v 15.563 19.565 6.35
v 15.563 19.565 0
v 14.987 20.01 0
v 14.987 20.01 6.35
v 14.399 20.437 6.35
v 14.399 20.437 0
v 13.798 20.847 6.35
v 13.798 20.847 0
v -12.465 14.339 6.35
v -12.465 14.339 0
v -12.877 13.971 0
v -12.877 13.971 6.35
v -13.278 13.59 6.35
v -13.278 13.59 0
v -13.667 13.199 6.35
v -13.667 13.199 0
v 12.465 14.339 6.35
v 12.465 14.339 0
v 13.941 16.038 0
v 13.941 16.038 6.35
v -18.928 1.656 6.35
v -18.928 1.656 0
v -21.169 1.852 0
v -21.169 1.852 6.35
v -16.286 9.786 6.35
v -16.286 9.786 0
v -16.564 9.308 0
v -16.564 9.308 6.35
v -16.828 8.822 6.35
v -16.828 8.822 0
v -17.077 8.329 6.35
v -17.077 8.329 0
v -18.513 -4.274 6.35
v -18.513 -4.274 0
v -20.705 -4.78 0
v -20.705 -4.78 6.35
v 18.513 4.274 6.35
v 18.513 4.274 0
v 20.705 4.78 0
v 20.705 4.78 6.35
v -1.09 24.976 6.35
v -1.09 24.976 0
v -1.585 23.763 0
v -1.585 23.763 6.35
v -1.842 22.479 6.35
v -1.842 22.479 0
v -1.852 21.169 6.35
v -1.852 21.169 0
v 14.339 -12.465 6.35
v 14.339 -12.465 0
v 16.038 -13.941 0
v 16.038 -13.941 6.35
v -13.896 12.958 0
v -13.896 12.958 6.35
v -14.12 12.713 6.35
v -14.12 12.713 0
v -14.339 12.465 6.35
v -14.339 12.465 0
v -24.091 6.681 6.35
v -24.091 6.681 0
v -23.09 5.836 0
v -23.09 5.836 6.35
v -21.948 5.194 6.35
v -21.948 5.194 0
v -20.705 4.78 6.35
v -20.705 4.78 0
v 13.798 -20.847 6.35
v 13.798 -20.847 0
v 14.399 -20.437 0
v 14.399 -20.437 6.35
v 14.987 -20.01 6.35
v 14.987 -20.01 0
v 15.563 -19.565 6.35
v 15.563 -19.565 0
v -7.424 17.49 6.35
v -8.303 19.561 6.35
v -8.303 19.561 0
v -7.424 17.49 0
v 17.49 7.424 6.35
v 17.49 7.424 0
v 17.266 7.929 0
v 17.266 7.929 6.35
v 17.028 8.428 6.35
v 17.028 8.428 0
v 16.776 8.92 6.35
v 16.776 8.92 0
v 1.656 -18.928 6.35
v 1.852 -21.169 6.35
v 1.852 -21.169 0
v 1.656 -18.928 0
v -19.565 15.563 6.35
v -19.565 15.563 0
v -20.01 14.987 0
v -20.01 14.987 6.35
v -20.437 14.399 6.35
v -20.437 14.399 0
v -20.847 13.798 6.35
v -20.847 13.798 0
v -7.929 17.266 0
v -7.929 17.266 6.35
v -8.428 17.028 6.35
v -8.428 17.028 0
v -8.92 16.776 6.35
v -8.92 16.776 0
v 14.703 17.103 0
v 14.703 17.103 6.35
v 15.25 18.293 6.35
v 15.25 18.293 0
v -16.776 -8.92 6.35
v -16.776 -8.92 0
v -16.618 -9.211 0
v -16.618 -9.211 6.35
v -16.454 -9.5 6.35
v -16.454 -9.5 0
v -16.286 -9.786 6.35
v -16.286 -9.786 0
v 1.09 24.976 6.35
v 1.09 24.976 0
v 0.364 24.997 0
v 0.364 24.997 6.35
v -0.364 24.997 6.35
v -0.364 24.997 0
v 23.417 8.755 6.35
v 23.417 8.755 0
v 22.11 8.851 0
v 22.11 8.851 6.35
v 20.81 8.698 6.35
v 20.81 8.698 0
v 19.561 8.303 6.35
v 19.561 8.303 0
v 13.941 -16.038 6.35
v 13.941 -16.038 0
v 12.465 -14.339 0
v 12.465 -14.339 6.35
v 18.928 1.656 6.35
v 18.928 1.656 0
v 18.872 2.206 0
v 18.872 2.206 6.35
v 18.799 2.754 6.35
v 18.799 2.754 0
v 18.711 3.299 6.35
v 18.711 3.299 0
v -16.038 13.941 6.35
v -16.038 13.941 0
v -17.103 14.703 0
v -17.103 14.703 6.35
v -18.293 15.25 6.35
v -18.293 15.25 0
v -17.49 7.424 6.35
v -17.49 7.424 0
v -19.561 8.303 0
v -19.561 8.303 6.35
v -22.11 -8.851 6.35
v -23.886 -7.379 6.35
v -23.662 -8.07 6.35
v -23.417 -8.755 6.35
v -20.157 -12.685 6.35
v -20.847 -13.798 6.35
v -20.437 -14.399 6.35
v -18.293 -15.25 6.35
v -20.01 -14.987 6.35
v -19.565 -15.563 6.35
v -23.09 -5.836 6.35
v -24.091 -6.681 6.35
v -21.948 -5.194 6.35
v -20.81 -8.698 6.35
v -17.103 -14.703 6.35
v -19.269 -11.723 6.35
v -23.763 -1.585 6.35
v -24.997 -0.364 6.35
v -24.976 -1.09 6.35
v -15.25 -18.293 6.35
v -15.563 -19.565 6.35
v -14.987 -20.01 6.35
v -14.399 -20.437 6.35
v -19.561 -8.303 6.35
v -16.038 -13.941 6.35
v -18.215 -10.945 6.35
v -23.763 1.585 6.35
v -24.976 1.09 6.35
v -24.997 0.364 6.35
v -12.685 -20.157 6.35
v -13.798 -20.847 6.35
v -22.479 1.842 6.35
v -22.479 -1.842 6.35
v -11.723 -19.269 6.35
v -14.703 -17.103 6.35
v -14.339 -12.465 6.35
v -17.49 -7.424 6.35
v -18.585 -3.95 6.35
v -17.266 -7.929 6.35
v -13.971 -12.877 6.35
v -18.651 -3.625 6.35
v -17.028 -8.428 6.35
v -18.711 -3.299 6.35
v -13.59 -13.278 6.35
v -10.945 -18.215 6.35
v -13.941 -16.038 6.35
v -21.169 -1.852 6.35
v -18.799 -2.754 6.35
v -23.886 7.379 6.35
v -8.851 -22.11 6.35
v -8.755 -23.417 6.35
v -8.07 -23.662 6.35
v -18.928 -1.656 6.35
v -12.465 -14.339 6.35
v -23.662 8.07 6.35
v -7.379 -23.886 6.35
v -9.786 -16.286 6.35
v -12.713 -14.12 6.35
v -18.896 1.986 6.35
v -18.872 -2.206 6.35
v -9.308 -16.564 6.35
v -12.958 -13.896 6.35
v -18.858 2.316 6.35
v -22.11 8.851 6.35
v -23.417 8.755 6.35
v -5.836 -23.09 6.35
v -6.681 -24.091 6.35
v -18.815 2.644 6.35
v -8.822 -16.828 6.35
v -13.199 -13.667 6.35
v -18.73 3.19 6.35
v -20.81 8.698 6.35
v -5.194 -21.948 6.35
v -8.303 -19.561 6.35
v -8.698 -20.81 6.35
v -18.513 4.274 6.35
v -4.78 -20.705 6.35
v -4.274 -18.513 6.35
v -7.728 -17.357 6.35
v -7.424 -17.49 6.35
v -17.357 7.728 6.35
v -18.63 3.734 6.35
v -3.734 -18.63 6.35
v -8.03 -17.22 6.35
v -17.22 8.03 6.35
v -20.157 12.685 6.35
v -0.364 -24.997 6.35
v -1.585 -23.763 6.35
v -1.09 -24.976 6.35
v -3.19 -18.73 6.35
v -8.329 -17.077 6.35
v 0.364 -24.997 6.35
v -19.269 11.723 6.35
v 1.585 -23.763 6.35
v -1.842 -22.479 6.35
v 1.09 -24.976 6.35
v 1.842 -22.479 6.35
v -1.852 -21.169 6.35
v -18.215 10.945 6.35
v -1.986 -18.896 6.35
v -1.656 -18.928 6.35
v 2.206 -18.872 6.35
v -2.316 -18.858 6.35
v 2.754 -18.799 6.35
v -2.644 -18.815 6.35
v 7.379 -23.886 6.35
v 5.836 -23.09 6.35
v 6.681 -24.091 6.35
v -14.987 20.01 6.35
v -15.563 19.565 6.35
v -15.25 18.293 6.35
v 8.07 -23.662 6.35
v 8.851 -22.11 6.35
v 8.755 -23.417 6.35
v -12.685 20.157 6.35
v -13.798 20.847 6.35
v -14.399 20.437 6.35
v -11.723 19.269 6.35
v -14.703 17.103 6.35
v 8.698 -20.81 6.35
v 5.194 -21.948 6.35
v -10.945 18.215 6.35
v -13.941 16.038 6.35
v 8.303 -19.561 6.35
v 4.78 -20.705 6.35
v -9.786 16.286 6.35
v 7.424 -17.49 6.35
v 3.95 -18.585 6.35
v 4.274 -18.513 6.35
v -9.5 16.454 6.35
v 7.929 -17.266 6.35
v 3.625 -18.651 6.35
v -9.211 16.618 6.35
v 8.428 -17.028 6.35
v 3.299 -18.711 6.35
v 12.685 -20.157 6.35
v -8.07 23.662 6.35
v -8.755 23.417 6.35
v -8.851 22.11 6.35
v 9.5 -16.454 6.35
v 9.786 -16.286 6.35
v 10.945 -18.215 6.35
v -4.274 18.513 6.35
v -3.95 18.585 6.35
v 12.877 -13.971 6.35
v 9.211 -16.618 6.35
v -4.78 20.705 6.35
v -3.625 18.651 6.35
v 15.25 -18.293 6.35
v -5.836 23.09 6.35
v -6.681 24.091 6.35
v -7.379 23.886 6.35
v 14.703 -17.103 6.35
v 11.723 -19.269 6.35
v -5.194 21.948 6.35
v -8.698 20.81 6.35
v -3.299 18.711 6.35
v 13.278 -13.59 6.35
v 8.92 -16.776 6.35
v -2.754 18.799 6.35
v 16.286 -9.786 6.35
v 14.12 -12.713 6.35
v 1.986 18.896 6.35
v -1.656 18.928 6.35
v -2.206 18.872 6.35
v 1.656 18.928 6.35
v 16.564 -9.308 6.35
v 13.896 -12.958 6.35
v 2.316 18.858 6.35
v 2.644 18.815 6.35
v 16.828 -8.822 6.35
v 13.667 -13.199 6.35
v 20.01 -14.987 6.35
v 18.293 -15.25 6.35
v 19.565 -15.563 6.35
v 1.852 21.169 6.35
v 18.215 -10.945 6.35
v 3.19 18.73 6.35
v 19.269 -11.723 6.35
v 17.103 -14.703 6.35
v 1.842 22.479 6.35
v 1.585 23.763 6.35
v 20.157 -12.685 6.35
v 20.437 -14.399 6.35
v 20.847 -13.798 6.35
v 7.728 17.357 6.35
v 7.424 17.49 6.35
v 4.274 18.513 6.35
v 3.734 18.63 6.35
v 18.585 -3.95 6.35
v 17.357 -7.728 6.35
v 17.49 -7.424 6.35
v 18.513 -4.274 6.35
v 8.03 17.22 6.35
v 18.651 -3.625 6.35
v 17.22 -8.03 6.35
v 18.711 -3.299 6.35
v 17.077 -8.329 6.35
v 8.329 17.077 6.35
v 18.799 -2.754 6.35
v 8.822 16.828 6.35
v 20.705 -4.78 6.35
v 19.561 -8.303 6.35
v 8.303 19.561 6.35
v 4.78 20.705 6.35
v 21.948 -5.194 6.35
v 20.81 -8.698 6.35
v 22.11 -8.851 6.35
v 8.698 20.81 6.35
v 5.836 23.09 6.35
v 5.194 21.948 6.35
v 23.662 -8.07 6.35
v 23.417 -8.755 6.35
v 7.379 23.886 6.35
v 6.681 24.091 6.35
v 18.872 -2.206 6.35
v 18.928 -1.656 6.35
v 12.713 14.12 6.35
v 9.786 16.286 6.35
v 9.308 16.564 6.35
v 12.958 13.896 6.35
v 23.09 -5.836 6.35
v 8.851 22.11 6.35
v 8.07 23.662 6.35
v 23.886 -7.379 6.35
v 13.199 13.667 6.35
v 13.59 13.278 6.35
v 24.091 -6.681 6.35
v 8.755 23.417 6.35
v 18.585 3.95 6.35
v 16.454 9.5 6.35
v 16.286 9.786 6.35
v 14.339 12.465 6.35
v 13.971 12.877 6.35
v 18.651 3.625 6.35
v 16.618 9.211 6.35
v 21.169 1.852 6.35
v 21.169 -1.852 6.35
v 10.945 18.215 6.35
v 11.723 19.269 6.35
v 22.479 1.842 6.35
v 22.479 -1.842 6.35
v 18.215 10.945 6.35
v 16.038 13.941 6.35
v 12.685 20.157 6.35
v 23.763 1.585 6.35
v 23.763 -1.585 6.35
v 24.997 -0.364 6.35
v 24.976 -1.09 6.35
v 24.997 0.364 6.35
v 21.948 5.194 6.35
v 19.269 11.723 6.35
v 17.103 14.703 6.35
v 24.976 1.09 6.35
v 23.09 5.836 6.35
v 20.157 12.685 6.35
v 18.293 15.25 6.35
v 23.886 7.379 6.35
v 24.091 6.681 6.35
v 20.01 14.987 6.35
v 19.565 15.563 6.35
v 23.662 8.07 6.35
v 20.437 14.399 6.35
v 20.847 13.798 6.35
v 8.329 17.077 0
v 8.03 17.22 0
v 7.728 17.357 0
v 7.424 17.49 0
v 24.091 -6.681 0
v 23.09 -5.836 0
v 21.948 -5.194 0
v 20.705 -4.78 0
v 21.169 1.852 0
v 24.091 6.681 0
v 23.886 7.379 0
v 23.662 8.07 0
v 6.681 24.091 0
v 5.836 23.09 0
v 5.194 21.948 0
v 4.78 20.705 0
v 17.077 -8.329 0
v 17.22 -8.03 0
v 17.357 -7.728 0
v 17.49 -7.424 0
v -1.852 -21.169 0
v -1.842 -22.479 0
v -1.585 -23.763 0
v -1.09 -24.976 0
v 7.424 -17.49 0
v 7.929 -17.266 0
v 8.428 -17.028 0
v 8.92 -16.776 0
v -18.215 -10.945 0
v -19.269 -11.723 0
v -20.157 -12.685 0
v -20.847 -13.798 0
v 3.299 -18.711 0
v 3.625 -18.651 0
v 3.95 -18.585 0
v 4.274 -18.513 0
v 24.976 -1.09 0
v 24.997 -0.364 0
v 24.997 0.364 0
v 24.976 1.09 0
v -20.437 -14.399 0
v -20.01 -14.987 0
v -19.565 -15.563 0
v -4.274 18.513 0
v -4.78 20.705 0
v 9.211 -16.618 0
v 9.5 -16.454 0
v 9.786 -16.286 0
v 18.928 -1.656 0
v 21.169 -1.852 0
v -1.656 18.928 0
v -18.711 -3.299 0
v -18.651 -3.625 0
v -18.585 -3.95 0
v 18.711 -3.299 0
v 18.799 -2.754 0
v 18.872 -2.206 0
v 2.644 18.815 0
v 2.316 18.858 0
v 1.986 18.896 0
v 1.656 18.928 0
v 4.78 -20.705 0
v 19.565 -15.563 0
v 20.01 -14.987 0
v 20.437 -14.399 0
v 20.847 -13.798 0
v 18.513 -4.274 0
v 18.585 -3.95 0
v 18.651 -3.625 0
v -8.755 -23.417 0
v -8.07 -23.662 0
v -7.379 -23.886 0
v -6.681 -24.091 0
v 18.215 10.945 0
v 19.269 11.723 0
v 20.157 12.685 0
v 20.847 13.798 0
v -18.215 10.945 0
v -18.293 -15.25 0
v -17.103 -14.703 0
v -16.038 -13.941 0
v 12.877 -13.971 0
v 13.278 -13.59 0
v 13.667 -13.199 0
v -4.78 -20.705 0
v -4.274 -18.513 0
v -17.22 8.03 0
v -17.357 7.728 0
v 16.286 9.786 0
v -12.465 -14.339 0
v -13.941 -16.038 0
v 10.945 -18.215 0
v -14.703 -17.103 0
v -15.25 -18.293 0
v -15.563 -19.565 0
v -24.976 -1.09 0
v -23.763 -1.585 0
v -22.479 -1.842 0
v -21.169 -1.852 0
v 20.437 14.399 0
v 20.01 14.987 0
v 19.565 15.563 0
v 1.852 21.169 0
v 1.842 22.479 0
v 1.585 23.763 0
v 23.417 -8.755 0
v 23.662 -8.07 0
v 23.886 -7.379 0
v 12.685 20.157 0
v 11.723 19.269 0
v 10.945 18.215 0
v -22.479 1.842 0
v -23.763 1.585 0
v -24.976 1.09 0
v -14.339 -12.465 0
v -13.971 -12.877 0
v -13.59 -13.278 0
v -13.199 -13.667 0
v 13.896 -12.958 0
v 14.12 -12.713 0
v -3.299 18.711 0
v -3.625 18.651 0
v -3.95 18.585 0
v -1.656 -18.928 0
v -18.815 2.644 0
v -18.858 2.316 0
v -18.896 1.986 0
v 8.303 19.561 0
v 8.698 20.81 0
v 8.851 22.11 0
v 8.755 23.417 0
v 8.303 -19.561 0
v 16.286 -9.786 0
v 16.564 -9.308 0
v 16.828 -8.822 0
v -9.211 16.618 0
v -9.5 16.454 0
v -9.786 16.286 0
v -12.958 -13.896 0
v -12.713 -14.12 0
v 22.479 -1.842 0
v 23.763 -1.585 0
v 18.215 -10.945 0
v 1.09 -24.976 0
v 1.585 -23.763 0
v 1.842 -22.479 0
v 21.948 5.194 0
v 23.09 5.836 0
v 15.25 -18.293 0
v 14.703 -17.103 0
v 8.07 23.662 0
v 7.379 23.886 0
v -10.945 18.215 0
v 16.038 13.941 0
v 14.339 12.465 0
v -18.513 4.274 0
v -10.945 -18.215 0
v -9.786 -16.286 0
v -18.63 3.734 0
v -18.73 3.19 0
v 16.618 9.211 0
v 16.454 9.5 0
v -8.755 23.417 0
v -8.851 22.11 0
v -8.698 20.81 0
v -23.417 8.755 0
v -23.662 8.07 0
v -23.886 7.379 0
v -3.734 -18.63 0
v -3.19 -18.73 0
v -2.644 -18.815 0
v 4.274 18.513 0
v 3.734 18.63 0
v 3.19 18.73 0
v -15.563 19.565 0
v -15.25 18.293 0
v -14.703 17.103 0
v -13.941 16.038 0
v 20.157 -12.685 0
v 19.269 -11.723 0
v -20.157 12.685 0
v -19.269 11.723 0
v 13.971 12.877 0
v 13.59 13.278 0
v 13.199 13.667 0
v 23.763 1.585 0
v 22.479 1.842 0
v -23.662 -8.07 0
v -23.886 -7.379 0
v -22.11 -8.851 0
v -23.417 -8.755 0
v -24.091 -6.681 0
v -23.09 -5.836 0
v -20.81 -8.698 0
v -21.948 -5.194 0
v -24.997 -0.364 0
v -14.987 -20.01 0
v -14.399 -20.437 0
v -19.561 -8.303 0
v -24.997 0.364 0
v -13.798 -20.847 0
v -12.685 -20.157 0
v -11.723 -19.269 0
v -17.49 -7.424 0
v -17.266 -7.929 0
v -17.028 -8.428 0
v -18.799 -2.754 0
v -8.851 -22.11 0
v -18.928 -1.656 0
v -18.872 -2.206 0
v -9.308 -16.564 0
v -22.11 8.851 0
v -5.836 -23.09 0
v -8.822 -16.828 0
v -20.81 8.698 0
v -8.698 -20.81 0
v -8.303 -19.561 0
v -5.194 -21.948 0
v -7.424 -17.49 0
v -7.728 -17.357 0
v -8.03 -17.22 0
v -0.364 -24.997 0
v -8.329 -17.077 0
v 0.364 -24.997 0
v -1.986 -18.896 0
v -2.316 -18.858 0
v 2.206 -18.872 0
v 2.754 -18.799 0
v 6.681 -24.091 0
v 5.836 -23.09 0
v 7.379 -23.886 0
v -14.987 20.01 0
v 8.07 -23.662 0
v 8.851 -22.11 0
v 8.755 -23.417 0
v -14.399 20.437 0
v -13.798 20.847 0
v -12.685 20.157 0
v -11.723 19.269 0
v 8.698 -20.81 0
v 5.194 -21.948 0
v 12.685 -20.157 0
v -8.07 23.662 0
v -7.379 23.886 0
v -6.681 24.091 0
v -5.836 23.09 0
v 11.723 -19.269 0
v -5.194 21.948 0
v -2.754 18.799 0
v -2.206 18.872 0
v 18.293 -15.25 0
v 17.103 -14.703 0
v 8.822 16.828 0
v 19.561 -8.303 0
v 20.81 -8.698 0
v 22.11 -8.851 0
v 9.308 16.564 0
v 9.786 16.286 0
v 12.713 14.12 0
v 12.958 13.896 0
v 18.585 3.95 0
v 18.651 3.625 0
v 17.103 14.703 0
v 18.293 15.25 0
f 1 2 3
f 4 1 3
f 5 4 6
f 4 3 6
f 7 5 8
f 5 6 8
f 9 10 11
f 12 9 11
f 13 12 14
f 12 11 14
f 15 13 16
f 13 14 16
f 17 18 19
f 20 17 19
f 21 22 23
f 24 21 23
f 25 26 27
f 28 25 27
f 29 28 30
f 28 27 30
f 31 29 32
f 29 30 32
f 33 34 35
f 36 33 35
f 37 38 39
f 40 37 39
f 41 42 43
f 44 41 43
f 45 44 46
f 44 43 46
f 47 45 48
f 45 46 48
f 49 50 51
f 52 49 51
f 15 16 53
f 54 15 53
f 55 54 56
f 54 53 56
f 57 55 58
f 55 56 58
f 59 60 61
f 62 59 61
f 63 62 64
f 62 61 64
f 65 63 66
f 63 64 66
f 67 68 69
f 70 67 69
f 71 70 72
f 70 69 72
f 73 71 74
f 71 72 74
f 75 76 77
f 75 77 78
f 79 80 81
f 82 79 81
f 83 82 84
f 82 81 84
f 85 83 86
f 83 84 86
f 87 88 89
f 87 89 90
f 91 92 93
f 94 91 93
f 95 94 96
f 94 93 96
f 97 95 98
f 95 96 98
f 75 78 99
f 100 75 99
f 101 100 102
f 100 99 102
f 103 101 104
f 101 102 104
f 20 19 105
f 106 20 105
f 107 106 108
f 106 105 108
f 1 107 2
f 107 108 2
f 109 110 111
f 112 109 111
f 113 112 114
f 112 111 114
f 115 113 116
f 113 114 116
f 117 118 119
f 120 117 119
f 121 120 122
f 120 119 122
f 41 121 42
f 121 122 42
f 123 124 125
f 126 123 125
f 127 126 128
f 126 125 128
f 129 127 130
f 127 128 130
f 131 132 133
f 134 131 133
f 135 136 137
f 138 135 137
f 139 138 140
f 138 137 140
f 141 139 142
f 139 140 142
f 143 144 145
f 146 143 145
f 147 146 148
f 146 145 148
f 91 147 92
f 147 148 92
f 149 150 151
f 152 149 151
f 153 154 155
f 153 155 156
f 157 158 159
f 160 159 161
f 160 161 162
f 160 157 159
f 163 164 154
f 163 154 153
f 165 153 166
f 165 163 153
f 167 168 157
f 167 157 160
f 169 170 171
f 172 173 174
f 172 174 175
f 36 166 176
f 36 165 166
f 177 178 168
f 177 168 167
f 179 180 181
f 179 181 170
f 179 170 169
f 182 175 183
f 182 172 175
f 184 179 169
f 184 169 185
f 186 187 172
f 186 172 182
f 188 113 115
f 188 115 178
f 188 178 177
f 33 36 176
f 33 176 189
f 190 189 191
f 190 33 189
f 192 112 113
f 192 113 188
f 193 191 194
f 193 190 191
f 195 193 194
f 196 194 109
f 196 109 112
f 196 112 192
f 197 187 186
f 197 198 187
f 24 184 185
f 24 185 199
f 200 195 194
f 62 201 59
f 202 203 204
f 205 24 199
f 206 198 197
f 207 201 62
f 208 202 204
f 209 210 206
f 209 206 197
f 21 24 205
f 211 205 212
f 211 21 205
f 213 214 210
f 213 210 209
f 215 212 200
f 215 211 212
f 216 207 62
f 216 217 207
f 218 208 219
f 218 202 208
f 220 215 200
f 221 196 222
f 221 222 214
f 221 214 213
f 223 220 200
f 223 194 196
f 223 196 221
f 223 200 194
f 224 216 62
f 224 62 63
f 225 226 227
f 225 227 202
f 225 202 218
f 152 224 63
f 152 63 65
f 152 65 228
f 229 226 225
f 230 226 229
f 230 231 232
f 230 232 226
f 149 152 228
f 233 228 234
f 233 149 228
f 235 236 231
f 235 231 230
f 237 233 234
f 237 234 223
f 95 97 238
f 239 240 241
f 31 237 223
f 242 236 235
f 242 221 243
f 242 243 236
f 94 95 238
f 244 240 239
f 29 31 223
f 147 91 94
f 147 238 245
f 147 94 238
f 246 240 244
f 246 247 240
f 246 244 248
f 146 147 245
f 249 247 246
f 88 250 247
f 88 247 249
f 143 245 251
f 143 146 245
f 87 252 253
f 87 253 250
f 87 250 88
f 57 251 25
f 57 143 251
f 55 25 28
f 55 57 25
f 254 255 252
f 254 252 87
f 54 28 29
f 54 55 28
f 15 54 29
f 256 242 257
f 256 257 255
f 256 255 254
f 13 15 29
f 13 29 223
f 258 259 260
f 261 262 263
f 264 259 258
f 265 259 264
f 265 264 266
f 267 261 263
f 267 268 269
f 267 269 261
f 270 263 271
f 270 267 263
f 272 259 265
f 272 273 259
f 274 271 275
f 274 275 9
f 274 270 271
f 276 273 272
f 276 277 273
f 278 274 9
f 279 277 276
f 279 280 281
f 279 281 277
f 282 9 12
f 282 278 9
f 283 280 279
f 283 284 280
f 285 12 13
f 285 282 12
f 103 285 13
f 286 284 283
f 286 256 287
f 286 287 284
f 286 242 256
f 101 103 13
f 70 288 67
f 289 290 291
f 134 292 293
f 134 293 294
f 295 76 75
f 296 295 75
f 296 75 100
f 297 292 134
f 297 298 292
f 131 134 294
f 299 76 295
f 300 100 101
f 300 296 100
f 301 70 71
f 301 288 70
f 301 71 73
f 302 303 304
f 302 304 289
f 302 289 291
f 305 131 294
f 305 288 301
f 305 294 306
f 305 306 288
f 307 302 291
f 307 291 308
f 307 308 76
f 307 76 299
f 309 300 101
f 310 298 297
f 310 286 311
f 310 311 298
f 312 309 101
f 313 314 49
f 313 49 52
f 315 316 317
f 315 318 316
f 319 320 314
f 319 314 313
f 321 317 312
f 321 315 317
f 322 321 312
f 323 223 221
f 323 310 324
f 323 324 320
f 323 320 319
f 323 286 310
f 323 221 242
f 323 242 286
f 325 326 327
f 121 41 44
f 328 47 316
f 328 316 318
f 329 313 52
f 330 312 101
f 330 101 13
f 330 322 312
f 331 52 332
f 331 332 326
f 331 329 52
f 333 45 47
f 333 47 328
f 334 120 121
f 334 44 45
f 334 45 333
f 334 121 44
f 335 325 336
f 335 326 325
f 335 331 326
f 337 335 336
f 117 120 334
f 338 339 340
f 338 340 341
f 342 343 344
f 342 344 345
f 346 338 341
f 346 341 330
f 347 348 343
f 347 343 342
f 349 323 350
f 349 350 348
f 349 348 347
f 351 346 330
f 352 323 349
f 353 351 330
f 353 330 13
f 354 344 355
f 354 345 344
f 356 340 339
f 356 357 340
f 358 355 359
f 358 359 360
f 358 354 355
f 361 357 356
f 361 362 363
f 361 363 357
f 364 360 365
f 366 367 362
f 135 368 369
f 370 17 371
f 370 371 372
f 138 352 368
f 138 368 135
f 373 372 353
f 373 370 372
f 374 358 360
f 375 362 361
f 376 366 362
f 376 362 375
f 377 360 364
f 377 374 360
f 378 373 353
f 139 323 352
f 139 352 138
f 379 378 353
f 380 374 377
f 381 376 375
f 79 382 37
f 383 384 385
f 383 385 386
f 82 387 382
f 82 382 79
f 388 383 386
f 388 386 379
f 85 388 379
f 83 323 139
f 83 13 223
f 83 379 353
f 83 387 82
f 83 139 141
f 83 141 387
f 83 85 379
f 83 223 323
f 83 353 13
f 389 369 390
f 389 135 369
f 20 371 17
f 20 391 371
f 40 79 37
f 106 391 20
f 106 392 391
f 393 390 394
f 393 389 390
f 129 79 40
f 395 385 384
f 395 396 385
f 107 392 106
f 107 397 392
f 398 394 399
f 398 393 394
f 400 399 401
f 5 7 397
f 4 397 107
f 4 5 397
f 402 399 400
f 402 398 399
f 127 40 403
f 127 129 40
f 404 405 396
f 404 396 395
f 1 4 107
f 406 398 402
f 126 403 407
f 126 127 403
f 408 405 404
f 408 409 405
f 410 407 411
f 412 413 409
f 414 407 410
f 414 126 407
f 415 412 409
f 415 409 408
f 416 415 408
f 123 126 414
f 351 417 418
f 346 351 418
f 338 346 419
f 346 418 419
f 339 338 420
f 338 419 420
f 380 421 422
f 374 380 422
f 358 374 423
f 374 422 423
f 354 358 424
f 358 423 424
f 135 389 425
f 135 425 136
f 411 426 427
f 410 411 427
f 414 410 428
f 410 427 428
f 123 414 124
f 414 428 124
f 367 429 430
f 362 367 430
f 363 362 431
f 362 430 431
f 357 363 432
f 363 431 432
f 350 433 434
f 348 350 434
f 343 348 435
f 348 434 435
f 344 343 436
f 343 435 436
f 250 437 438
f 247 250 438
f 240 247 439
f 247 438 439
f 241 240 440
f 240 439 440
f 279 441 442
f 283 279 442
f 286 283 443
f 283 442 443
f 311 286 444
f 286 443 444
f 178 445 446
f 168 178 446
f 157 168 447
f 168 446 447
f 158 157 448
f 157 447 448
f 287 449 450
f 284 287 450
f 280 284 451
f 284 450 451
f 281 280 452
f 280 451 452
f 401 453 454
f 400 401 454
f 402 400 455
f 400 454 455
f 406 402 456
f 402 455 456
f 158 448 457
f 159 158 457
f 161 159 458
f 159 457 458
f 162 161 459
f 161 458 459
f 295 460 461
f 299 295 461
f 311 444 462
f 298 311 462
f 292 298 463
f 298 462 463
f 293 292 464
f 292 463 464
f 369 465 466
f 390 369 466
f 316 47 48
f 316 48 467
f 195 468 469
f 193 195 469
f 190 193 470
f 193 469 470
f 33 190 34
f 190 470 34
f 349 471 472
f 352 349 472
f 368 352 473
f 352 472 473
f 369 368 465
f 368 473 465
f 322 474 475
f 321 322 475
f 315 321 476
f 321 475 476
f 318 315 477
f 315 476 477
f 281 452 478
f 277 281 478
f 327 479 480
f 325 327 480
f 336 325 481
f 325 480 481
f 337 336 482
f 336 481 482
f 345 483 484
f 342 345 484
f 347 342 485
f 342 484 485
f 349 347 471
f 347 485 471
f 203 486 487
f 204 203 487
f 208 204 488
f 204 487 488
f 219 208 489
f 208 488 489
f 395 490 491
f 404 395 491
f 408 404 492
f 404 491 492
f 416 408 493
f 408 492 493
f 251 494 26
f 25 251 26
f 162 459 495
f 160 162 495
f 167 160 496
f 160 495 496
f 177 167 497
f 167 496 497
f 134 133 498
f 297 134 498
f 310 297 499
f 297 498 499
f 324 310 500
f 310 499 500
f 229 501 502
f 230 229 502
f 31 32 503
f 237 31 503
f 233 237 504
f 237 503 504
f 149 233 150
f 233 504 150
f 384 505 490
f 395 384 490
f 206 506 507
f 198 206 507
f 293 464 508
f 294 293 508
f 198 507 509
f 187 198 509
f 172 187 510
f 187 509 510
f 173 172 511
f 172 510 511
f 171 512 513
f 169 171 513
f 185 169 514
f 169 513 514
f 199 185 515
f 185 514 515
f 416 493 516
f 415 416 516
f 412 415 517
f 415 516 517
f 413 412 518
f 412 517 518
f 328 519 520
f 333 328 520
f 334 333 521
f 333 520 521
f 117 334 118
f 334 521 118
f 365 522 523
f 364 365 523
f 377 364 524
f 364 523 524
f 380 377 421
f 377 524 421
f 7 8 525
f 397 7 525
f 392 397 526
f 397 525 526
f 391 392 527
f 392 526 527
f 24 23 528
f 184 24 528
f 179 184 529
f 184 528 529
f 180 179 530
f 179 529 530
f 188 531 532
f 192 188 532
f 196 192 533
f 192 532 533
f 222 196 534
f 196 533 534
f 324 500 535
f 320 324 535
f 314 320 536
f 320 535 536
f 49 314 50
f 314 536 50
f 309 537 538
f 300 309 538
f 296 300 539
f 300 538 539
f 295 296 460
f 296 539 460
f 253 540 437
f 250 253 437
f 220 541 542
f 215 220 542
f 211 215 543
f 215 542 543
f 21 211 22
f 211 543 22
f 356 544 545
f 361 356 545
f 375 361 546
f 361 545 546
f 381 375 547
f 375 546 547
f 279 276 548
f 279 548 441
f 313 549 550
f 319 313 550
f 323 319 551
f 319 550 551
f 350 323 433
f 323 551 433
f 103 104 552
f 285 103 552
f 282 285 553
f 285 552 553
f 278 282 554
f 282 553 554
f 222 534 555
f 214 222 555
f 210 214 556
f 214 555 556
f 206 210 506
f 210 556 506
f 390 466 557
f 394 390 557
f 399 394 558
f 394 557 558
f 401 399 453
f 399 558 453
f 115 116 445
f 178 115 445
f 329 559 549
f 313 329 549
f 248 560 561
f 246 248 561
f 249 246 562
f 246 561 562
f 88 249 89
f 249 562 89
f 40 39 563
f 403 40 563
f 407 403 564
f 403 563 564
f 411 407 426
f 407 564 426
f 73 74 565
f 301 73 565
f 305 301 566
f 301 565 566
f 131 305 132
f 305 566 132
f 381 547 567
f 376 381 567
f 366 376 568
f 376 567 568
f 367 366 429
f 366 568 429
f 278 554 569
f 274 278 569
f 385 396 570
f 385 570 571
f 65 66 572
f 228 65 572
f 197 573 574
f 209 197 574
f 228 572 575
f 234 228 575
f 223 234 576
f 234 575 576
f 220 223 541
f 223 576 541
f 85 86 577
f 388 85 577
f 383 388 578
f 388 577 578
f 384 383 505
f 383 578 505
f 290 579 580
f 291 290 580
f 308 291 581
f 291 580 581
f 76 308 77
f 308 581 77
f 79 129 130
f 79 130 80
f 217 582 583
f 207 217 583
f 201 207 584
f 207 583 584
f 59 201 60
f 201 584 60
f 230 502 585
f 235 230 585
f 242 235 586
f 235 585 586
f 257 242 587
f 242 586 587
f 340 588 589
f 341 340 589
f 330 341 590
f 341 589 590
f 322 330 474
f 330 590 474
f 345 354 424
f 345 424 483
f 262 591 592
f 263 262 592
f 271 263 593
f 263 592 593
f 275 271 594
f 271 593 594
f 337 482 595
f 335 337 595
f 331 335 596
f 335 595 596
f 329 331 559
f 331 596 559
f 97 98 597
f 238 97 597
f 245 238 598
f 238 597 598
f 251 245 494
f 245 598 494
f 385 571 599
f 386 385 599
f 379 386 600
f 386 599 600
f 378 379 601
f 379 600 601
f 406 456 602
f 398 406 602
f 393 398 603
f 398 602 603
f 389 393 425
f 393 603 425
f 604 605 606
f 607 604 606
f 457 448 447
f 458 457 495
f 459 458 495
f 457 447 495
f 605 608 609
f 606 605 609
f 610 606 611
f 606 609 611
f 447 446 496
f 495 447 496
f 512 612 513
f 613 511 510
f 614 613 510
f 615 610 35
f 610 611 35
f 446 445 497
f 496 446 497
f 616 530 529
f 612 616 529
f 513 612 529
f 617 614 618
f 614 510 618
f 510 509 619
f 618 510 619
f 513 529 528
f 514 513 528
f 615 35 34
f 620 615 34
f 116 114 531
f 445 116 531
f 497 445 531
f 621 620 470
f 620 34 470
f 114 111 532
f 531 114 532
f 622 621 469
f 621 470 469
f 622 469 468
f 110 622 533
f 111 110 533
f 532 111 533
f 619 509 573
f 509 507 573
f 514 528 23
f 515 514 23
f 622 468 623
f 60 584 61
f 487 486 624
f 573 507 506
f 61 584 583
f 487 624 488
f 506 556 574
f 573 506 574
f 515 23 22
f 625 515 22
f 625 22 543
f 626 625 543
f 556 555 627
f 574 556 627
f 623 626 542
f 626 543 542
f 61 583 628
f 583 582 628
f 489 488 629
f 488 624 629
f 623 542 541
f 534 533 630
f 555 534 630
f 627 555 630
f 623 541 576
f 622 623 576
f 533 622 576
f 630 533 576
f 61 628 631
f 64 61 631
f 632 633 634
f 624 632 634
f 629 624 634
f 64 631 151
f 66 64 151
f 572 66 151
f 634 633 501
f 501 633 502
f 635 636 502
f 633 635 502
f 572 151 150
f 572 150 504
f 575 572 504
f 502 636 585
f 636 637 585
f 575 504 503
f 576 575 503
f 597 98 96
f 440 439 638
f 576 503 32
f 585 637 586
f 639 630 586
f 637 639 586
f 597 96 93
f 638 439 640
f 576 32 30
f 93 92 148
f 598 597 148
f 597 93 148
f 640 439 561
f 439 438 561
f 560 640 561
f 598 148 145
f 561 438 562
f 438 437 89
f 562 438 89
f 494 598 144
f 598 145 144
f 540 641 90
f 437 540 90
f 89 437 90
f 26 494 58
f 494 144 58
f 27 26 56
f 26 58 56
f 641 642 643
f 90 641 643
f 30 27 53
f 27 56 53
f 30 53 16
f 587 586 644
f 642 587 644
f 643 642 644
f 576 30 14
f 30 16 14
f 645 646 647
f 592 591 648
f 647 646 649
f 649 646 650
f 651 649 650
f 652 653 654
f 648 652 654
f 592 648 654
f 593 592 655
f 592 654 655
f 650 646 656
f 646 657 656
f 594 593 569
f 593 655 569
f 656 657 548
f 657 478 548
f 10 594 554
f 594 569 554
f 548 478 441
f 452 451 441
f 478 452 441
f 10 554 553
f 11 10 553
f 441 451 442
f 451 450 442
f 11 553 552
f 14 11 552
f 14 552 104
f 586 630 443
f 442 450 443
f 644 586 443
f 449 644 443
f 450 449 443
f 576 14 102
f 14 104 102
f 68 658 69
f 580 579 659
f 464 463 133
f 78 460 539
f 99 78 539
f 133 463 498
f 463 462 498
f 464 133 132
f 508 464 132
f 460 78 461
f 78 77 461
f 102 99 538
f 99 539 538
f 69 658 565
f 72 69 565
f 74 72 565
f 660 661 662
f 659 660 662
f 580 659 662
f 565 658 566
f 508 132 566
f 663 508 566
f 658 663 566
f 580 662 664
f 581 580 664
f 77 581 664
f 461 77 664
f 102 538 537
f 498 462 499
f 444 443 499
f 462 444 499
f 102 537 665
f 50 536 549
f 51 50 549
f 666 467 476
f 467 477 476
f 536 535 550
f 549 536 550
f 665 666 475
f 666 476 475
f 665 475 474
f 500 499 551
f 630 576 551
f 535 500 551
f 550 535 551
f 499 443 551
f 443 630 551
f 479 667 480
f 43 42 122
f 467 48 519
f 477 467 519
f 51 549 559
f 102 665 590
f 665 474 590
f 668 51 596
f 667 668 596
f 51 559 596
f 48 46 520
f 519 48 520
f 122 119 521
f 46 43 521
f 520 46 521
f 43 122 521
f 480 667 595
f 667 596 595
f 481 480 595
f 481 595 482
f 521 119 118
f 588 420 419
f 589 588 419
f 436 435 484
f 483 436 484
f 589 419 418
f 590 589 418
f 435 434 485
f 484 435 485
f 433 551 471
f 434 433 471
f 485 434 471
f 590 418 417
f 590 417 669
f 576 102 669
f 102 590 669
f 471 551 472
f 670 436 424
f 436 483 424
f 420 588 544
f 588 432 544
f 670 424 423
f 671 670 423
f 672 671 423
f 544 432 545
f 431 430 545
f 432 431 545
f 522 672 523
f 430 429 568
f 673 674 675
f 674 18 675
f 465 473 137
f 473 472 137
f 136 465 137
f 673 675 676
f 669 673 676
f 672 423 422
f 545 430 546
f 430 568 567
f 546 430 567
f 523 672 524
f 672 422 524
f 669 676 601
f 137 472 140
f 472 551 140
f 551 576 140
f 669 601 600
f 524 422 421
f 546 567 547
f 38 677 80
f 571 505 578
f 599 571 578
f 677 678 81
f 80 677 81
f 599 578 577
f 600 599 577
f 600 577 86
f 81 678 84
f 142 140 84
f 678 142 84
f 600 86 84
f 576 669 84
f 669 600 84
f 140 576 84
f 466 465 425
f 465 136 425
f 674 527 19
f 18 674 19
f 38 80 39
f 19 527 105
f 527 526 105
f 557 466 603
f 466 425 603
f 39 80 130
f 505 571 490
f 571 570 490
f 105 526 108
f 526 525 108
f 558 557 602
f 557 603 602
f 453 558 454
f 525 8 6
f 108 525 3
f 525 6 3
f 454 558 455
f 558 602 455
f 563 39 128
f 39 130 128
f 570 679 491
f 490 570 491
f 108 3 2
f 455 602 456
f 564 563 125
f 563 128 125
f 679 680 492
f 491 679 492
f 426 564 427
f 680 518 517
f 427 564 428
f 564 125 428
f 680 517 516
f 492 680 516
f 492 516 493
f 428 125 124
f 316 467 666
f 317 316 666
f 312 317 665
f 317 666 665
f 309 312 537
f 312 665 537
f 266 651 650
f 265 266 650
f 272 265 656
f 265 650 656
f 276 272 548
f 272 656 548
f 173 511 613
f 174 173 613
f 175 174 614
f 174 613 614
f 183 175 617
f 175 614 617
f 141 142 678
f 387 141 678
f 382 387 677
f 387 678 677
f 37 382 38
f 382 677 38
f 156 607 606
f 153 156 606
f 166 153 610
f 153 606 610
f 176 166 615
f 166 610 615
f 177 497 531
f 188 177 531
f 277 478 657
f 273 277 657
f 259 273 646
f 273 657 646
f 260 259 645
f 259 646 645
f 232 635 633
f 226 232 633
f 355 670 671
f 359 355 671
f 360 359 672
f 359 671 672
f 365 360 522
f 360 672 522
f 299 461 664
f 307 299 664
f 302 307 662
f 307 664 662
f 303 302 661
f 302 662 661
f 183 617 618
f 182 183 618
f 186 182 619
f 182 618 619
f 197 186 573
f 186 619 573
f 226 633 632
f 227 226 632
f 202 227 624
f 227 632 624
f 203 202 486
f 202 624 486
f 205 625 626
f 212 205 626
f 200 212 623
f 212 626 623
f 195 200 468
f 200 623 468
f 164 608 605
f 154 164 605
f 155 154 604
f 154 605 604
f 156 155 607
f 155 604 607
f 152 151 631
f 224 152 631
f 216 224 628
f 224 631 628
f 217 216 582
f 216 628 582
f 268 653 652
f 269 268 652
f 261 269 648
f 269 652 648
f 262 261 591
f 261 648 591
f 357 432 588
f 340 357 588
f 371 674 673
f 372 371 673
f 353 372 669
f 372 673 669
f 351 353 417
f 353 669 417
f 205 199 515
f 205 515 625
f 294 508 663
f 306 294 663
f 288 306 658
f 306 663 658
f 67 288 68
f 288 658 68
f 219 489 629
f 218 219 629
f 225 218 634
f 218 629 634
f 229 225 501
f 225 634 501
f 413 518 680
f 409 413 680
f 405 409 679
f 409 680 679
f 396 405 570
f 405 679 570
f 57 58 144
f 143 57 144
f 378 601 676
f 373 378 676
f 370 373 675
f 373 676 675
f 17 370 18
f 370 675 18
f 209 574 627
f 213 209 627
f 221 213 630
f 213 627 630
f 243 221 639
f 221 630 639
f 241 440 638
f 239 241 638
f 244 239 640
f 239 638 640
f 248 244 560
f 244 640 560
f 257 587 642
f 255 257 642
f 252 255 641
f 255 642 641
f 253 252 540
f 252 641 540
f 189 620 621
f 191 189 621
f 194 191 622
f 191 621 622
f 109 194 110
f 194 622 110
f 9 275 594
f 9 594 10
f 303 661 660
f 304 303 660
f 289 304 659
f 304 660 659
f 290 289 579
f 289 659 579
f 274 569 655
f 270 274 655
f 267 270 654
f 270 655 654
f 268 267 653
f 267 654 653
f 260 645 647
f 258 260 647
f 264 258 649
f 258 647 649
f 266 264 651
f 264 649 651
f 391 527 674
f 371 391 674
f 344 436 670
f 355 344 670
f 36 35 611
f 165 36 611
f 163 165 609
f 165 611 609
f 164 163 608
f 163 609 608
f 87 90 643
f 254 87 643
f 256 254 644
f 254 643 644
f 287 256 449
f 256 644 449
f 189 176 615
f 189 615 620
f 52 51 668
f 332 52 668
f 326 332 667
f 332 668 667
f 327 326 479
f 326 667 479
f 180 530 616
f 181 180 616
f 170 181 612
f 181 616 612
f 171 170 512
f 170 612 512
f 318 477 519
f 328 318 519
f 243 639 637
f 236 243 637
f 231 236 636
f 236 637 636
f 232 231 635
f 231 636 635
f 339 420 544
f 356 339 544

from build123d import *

# Parameters (mm, degrees)
BOSS_EXTRUDE2_DEPTH = 6.35
CIRPATTERN1_COUNT   = 20


with BuildPart() as part:
    # Sketch4 → Boss-Extrude2 (new body)
    with BuildSketch(Plane.XY):
        with BuildLine():
            Line((21.169137334, 1.852059533), (18.927699264, 1.655959112))
            ThreePointArc((18.927699264, 1.655959112), (18.837452366, 2.479997652), (18.711347307, 3.299315376))
            Line((18.711347307, 3.299315376), (0, 0))
            Line((0, 0), (18.711347307, -3.299315376))
            ThreePointArc((18.711347307, -3.299315376), (18.837452366, -2.479997652), (18.927699264, -1.655959112))
            Line((18.927699264, -1.655959112), (21.169137334, -1.852059533))
            ThreePointArc((21.169137334, -1.852059533), (23.12724618, -1.744088061), (24.97620554, -1.090484684))
            ThreePointArc((24.97620554, -1.090484684), (25, 0), (24.97620554, 1.090484684))
            ThreePointArc((24.97620554, 1.090484684), (23.12724618, 1.744088061), (21.169137334, 1.852059533))
        make_face()
    boss_extrude2 = extrude(amount=BOSS_EXTRUDE2_DEPTH)

    # CirPattern1: Boss-Extrude2 ×20 about axis
    cirpattern1_axis = Axis((0, 0, 0), (0, 0, 1))
    for i in range(1, CIRPATTERN1_COUNT):
        add(boss_extrude2.rotate(cirpattern1_axis, i * 360 / CIRPATTERN1_COUNT))


solid = part.part
